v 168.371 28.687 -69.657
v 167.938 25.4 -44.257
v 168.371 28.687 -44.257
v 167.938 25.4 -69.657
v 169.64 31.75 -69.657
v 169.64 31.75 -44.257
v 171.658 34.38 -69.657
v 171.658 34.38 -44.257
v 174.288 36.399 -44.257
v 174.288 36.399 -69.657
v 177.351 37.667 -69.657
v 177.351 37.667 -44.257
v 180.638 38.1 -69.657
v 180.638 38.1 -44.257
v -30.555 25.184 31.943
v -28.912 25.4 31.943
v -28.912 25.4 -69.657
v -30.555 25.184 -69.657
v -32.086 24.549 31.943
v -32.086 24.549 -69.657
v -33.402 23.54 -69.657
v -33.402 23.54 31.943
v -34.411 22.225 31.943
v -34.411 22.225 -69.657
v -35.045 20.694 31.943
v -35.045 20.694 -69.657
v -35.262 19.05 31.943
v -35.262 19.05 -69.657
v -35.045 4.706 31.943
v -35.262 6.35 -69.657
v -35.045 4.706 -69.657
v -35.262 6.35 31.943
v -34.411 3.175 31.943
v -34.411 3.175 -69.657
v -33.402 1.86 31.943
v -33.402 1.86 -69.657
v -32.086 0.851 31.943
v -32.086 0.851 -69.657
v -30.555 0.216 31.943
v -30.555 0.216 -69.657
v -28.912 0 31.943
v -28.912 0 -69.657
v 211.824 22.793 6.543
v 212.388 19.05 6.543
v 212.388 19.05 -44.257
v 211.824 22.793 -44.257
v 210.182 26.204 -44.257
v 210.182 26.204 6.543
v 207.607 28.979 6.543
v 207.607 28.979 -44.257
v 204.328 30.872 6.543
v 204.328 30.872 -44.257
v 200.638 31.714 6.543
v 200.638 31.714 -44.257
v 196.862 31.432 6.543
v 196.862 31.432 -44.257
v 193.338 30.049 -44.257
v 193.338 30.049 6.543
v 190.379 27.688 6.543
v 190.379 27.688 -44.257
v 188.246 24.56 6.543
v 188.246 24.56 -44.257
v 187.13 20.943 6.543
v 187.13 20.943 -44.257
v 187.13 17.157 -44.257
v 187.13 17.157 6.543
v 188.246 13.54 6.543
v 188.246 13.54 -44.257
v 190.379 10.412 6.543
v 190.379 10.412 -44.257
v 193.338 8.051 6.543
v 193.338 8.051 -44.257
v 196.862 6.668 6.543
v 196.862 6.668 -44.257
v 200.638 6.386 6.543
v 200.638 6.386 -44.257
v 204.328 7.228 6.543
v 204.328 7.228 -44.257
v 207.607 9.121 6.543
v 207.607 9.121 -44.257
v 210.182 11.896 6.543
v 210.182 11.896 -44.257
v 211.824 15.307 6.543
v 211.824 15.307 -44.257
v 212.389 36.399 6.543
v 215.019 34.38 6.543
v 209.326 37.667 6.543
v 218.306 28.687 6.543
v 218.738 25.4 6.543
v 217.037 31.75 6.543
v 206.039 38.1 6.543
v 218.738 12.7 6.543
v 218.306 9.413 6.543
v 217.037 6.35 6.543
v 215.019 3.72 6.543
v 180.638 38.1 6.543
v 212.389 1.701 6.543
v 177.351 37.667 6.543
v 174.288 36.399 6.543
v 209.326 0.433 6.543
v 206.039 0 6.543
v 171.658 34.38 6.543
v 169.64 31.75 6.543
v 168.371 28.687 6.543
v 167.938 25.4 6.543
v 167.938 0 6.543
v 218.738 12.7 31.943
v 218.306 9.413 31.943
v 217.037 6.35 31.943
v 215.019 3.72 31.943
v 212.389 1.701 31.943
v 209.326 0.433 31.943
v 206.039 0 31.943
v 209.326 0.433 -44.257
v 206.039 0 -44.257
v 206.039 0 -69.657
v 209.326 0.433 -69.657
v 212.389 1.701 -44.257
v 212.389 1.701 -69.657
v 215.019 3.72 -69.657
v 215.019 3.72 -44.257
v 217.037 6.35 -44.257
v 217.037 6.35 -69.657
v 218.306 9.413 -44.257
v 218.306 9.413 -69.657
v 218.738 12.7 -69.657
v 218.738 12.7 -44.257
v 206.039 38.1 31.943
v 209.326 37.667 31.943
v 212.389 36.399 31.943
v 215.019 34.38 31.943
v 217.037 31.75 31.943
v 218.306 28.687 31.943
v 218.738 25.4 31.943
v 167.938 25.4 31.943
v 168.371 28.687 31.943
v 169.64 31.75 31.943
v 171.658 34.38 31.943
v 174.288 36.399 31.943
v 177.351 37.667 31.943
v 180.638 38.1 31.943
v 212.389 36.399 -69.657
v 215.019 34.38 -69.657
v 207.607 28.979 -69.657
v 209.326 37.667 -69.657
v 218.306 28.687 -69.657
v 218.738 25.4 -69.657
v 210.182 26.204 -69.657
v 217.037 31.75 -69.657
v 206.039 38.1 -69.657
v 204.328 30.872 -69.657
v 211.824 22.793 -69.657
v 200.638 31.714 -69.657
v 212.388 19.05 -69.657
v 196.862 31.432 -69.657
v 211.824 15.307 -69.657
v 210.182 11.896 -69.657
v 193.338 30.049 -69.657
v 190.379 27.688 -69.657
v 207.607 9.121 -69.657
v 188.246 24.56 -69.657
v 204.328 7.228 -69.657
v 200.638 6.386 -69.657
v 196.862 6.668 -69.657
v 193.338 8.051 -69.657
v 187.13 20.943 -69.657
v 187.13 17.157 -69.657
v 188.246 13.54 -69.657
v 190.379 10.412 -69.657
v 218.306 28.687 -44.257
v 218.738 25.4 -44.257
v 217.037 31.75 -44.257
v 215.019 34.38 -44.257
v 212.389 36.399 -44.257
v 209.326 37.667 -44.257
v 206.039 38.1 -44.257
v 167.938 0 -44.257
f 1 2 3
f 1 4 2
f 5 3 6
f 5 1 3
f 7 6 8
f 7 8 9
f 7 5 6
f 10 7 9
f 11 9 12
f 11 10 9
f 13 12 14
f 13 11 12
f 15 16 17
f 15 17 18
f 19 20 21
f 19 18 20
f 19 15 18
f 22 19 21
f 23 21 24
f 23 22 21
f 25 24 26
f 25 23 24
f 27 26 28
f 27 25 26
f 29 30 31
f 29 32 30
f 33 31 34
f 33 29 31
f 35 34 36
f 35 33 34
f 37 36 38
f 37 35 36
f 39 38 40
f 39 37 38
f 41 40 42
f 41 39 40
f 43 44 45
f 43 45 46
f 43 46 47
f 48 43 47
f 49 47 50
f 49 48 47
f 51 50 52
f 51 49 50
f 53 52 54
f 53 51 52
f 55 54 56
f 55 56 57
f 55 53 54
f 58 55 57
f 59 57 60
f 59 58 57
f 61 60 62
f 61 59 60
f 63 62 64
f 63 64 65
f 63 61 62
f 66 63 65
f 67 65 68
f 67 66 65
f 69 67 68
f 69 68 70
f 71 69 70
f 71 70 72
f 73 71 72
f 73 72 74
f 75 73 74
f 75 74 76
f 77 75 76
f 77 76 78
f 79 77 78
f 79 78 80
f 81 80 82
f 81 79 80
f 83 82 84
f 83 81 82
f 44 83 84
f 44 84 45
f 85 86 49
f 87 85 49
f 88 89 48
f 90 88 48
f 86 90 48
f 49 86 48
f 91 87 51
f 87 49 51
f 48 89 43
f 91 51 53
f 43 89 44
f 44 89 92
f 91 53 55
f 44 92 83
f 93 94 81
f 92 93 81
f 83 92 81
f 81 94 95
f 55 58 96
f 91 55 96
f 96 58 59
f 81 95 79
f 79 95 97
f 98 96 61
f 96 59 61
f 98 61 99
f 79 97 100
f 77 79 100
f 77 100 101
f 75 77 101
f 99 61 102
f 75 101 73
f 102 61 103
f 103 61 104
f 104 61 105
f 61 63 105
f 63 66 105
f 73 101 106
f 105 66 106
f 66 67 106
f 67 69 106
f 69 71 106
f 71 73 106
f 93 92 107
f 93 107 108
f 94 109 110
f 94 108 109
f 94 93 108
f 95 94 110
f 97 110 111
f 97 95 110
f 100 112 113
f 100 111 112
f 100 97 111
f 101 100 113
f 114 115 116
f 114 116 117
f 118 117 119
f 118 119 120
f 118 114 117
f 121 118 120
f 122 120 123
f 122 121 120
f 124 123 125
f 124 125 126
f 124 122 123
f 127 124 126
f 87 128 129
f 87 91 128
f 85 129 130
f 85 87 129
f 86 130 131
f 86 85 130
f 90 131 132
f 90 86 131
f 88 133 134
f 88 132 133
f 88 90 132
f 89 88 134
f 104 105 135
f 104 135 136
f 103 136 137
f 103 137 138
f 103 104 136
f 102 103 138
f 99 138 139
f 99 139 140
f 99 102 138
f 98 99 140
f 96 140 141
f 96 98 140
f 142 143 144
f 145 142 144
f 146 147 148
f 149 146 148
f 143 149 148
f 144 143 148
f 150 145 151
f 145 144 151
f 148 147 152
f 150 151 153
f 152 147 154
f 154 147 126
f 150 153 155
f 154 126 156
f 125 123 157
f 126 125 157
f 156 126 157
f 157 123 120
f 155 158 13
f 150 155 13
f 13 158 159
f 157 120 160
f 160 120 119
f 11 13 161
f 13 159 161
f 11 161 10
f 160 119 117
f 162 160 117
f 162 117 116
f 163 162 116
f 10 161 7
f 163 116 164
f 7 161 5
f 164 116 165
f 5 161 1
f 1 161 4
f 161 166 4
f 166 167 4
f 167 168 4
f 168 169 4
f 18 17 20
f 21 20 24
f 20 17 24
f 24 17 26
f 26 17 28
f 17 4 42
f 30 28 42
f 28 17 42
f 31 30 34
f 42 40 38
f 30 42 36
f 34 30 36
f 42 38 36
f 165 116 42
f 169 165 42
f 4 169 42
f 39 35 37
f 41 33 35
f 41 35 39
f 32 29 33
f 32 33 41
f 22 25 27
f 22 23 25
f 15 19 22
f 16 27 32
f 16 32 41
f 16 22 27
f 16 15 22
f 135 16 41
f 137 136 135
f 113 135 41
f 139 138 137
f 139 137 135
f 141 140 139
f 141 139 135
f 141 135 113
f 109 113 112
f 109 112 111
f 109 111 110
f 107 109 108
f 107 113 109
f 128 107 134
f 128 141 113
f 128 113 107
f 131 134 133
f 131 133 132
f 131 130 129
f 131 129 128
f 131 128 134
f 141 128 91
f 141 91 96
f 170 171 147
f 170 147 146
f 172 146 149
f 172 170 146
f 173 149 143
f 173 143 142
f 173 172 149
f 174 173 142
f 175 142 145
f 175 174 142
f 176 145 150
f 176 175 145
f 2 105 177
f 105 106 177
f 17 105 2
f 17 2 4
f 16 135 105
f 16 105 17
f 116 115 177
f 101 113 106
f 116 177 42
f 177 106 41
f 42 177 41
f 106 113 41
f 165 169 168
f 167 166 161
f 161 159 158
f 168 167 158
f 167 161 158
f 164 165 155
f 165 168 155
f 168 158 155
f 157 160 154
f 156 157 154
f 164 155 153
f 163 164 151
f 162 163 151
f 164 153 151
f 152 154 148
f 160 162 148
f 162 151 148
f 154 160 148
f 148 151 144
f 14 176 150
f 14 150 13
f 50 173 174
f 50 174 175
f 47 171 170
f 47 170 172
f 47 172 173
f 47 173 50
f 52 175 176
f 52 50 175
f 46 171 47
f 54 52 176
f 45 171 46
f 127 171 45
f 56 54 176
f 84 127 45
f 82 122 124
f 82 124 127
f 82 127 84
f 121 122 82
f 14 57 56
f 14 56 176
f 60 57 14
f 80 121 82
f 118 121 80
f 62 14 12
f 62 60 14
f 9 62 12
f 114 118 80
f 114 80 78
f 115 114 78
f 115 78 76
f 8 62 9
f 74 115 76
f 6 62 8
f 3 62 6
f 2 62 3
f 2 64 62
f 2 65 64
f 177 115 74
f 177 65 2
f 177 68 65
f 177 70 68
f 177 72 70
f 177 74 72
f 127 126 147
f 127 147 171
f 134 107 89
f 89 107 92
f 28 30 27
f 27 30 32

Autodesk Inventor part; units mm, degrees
ref_plane "YZ Plane" through (0, 0, 0) normal (1, 0, 0) x (0, 1, 0)
ref_plane "XZ Plane" through (0, 0, 0) normal (0, 1, 0) x (-1, 0, 0)
ref_plane "XY Plane" through (0, 0, 0) normal (0, 0, 1) x (1, 0, 0)
sketch "Sketch1" plane through (0, 0, 0) normal (0, 1, 0) x (-1, 0, 0)
  line L0 (35.2615, 31.9433) -> (-167.9385, 31.9433)
  line L1 (-167.9385, 31.9433) -> (-167.9385, -69.6567)
  line L2 (-167.9385, -69.6567) -> (35.2615, -69.6567)
  line L3 (35.2615, -69.6567) -> (35.2615, 31.9433)
  line L4 (-167.9385, 31.9433) -> (-218.7385, 31.9433)
  line L5 (-218.7385, 31.9433) -> (-218.7385, 6.5433)
  line L6 (-218.7385, 6.5433) -> (-167.9385, 6.5433)
  line L7 (-167.9385, 6.5433) -> (-167.9385, 31.9433)
  line L8 (-167.9385, -69.6567) -> (-218.7385, -69.6567)
  line L9 (-218.7385, -69.6567) -> (-218.7385, -44.2567)
  line L10 (-218.7385, -44.2567) -> (-167.9385, -44.2567)
  line L11 (-167.9385, -44.2567) -> (-167.9385, -69.6567)
  point P0 (0, 0)
  point P1 (-167.9385, 6.5433)
  dimension "d0" = 101.6
  dimension "d1" = 203.2
  dimension "d2" = 50.8
  dimension "d3" = 50.8
extrude "Extrusion1" add sketch "Sketch1" along normal blind 38.1 contours L1 L6 L5 L4 | L8 L9 L10 L1
extrude "Extrusion2" add sketch "Sketch1" along normal blind 25.4 contours L3 L2 L1 L0
sketch "Sketch2" plane through (167.9385, 38.1, 31.9433) normal (0, 0, 1) x (1, 0, 0)
  line L0 (50.8, -38.1) -> (50.8, 0) construction
  line L1 (0, 0) -> (50.8, 0) construction
  line L2 (50.8, -19.05) -> (31.75, -19.05) construction
  line L3 (31.75, -19.05) -> (31.75, 0) construction
  line L4 (31.75, 0) -> (50.8, 0) construction
  line L5 (50.8, 0) -> (50.8, -19.05) construction
  circle A0 centre (31.75, -19.05) radius 12.7
  point P0 (-167.9385, -38.1)
  dimension "d8" = 25.4
extrude "Extrusion3" add sketch "Sketch2" against normal through all
fillet "Fillet1" radius 12.7 6 edges at (167.9385, 38.1, 19.2433) (167.9385, 38.1, -56.9567) (218.7385, 38.1, 19.2433) (218.7385, 38.1, -56.9567) (218.7385, 0, 19.2433) (218.7385, 0, -56.9567)
fillet "Fillet2" radius 6.35 2 edges at (-35.2615, 25.4, -18.8567) (-35.2615, 0, -18.8567)
properties part number "Pedals"
